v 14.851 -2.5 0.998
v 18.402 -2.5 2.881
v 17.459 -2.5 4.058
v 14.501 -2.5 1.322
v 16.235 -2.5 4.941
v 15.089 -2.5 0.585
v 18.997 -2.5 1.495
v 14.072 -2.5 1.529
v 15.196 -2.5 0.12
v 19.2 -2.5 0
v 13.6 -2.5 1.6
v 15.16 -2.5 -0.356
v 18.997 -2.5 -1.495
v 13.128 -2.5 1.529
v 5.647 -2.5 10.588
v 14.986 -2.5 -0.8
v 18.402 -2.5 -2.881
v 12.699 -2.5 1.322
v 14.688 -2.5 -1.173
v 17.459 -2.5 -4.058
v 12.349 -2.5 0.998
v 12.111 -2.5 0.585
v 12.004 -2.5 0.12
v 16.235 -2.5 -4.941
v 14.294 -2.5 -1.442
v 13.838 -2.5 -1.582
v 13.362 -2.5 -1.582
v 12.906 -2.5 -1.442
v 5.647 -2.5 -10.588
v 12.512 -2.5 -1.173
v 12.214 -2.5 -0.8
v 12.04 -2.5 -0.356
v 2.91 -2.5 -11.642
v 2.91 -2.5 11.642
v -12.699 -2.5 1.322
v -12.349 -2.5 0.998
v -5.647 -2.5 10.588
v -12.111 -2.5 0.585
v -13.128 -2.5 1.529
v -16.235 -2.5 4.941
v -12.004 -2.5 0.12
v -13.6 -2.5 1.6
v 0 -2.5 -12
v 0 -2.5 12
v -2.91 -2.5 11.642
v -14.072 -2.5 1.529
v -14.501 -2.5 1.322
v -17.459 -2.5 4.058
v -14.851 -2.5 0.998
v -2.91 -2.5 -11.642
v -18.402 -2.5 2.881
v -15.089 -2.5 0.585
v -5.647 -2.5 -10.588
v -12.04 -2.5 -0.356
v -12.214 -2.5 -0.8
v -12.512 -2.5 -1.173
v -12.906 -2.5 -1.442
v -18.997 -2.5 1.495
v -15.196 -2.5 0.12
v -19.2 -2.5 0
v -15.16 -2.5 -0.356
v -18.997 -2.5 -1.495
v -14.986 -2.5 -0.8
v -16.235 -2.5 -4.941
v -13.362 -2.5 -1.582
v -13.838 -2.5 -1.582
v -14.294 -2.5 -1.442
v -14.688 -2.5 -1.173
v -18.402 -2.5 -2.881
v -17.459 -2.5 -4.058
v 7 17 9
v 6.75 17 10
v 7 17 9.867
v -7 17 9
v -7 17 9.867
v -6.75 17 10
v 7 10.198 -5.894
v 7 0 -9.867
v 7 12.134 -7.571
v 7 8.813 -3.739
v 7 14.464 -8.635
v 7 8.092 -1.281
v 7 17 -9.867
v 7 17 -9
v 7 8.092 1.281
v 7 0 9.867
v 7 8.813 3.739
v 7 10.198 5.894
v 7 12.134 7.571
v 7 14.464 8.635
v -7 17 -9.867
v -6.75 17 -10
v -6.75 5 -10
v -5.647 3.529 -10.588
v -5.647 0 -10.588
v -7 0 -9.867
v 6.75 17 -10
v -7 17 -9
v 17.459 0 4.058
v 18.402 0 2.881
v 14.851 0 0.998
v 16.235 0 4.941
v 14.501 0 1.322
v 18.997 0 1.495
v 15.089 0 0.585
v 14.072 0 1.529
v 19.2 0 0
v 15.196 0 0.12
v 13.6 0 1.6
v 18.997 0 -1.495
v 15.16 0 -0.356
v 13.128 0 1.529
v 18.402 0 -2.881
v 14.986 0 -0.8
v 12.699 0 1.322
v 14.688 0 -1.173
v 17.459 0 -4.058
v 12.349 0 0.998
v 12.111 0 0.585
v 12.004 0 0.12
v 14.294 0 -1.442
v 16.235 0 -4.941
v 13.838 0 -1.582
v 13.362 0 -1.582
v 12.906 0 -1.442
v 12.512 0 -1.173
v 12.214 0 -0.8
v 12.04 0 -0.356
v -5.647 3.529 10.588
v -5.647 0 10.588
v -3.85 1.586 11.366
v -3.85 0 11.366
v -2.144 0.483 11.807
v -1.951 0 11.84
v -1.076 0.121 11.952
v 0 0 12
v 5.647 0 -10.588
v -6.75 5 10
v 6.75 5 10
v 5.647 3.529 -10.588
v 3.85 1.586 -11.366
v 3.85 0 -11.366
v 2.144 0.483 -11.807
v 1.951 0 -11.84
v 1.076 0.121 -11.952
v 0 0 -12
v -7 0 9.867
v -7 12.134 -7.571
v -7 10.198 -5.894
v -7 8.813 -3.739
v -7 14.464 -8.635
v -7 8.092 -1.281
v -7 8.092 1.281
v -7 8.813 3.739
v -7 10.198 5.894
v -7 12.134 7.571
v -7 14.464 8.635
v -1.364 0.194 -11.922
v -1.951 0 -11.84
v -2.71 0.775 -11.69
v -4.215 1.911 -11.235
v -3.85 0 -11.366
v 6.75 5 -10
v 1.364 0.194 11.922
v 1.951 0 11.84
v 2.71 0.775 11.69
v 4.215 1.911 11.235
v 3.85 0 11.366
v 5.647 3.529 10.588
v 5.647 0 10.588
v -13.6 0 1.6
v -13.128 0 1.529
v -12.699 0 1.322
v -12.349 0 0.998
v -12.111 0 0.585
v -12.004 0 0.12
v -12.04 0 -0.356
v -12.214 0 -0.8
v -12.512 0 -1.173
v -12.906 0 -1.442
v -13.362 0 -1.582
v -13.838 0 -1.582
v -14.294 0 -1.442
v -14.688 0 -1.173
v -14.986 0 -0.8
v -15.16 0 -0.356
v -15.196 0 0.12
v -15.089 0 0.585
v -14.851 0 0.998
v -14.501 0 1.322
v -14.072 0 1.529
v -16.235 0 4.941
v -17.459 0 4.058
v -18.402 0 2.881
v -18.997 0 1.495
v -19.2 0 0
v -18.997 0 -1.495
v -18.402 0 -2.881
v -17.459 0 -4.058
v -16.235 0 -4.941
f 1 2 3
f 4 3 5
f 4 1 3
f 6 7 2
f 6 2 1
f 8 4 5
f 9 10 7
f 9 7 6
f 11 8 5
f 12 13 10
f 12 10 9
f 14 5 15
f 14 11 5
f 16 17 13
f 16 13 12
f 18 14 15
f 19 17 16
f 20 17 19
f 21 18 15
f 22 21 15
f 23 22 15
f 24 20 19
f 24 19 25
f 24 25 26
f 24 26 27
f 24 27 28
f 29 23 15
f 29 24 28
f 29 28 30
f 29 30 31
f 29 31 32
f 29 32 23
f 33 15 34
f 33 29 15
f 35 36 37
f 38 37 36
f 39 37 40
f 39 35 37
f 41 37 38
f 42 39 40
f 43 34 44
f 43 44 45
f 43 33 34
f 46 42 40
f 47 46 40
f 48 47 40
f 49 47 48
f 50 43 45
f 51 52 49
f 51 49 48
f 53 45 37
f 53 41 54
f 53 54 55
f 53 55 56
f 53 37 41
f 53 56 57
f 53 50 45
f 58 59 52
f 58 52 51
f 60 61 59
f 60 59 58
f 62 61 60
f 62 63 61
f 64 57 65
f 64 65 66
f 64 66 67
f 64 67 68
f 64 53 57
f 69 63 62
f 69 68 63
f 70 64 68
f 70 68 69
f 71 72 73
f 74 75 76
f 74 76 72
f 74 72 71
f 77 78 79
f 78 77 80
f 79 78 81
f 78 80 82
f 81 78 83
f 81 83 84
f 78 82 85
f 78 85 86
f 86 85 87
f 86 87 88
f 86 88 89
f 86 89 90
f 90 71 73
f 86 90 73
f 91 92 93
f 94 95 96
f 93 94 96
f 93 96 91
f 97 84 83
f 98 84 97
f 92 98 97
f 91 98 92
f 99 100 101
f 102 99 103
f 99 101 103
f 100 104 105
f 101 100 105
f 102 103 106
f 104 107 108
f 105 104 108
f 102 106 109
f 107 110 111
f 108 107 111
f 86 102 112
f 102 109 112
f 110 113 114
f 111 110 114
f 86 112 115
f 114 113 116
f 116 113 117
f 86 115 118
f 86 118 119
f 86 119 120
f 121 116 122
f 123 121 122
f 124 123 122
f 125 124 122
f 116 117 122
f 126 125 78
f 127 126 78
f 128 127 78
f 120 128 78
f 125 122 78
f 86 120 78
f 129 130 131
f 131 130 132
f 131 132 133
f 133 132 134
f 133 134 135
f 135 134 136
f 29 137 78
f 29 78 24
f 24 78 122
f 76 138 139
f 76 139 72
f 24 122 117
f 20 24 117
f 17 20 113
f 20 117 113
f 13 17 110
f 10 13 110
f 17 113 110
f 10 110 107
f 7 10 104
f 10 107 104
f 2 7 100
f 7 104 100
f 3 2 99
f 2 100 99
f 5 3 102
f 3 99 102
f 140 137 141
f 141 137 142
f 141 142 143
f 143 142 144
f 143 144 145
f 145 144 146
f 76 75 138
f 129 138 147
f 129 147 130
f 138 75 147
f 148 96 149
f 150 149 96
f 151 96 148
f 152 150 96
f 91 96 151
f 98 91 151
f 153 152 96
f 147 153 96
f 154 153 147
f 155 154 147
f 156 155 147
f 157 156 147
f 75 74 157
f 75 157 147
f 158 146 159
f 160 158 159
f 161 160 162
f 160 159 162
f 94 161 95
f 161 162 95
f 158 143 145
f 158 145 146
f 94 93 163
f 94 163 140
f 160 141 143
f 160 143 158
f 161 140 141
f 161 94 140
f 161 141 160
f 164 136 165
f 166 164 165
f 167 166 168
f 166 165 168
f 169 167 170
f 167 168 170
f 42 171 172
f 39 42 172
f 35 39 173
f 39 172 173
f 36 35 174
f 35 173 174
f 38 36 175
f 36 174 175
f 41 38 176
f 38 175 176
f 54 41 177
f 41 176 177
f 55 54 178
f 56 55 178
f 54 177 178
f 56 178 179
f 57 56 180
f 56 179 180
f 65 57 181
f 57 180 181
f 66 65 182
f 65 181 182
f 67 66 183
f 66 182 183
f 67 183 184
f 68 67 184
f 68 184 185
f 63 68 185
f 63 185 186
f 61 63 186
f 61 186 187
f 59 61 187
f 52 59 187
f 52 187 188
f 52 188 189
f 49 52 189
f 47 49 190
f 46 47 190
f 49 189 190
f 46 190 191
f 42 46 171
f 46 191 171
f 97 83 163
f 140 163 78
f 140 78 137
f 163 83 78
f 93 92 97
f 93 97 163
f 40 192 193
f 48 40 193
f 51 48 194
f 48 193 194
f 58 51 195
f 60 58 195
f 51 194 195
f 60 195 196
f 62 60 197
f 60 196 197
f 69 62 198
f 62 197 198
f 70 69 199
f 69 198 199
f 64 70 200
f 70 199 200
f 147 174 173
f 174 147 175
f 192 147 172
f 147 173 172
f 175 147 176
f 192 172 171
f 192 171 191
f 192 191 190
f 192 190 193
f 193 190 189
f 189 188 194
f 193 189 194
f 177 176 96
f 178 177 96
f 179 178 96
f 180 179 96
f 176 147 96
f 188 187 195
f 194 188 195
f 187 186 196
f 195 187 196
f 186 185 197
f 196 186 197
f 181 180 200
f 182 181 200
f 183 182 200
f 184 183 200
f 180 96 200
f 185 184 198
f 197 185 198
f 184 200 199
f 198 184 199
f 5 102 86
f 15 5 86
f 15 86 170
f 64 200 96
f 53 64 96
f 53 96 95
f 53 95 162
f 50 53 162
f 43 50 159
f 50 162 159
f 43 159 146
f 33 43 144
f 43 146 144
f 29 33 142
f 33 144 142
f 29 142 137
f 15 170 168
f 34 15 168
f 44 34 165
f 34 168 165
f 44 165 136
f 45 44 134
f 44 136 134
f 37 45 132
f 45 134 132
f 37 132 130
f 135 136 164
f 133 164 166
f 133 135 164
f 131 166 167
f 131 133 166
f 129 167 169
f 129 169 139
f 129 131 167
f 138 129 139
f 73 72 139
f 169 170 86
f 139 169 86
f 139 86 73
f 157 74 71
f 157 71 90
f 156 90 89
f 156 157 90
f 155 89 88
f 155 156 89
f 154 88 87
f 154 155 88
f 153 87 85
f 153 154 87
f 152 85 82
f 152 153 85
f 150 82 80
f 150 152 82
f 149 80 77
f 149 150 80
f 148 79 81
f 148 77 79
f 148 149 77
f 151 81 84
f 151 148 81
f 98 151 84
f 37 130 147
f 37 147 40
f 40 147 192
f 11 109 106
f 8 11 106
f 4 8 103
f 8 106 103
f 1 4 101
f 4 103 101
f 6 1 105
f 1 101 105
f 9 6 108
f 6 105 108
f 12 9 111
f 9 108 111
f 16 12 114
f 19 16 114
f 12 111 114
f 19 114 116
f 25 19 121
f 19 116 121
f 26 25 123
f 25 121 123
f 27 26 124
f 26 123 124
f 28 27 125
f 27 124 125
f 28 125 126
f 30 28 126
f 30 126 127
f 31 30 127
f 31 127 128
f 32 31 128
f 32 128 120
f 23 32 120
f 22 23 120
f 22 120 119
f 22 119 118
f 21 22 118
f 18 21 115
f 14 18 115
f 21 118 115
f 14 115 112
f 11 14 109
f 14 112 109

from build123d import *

# Parameters (mm, degrees)
SKETCH_1_R               = 1.6
EXTRUDE_1_DEPTH          = 2.5
EXTRUDE_2_DEPTH          = 7
EXTRUDE_2_DEPTH_BACK     = 7
SKETCH_4_R               = 25
CUT_EXTRUDE_3_DEPTH      = 29.313247783
CUT_EXTRUDE_4_DEPTH      = 10
CUT_EXTRUDE_4_DEPTH_BACK = 10
SKETCH_7_R               = 9


with BuildPart() as part:
    # 草图1 → 凸台-拉伸1 (new body)
    with BuildSketch(Plane(origin=(0, 0, 0), x_dir=(1, 0, 0), z_dir=(0, 1, 0))):
        with BuildLine():
            Line((16.235294118, -4.941176471), (5.647058824, -10.588235294))
            ThreePointArc((5.647058824, -10.588235294), (0, -12), (-5.647058824, -10.588235294))
            Line((-5.647058824, -10.588235294), (-16.235294118, -4.941176471))
            ThreePointArc((-16.235294118, -4.941176471), (-19.2, 0), (-16.235294118, 4.941176471))
            Line((-16.235294118, 4.941176471), (-5.647058824, 10.588235294))
            ThreePointArc((-5.647058824, 10.588235294), (0, 12), (5.647058824, 10.588235294))
            Line((5.647058824, 10.588235294), (16.235294118, 4.941176471))
            ThreePointArc((16.235294118, 4.941176471), (19.2, 0), (16.235294118, -4.941176471))
        make_face()
        with Locations((-13.6, 0)):
            Circle(SKETCH_1_R, mode=Mode.SUBTRACT)
        with Locations((13.6, 0)):
            Circle(SKETCH_1_R, mode=Mode.SUBTRACT)
    extrude(amount=-EXTRUDE_1_DEPTH)

    # 草图2 → 凸台-拉伸2 (add, two sides: drawn at the far end of the back side and taken through both)
    with BuildSketch(Plane(origin=(0, 0, 0), x_dir=(0, 0, -1), z_dir=(1, 0, 0)).offset(-EXTRUDE_2_DEPTH_BACK)):
        Polygon((12, 0), (-12, 0), (-10, 5), (-10, 17), (10, 17), (10, 5), align=None)
    extrude(amount=EXTRUDE_2_DEPTH + EXTRUDE_2_DEPTH_BACK)

    # 草图4 → 切除-拉伸3 (cut, through all)
    with BuildSketch(Plane(origin=(0, 0, 0), x_dir=(1, 0, 0), z_dir=(0, 1, 0))):
        Circle(SKETCH_4_R)
        with BuildLine():
            Line((5.647058824, -10.588235294), (7, -9.866666667))
            Line((7, -9.866666667), (16.235294118, -4.941176471))
            ThreePointArc((16.235294118, -4.941176471), (19.2, 0), (16.235294118, 4.941176471))
            Line((16.235294118, 4.941176471), (7, 9.866666667))
            Line((7, 9.866666667), (5.647058824, 10.588235294))
            ThreePointArc((5.647058824, 10.588235294), (2.9104275, 11.641710002), (0, 12))
            ThreePointArc((0, 12), (-2.9104275, 11.641710002), (-5.647058824, 10.588235294))
            Line((-5.647058824, 10.588235294), (-7, 9.866666667))
            Line((-7, 9.866666667), (-16.235294118, 4.941176471))
            ThreePointArc((-16.235294118, 4.941176471), (-19.2, 0), (-16.235294118, -4.941176471))
            Line((-16.235294118, -4.941176471), (-7, -9.866666667))
            Line((-7, -9.866666667), (-5.647058824, -10.588235294))
            ThreePointArc((-5.647058824, -10.588235294), (-2.9104275, -11.641710002), (0, -12))
            ThreePointArc((0, -12), (2.9104275, -11.641710002), (5.647058824, -10.588235294))
        make_face(mode=Mode.SUBTRACT)
    extrude(amount=CUT_EXTRUDE_3_DEPTH, mode=Mode.SUBTRACT)

    # 草图7 → 切除-拉伸4 (cut, two sides: drawn at the far end of the back side and taken through both)
    with BuildSketch(Plane(origin=(0, 0, 0), x_dir=(0, 0, -1), z_dir=(1, 0, 0)).offset(-CUT_EXTRUDE_4_DEPTH_BACK)):
        with Locations((0, 17)):
            Circle(SKETCH_7_R)
    extrude(amount=CUT_EXTRUDE_4_DEPTH + CUT_EXTRUDE_4_DEPTH_BACK, mode=Mode.SUBTRACT)


solid = part.part
